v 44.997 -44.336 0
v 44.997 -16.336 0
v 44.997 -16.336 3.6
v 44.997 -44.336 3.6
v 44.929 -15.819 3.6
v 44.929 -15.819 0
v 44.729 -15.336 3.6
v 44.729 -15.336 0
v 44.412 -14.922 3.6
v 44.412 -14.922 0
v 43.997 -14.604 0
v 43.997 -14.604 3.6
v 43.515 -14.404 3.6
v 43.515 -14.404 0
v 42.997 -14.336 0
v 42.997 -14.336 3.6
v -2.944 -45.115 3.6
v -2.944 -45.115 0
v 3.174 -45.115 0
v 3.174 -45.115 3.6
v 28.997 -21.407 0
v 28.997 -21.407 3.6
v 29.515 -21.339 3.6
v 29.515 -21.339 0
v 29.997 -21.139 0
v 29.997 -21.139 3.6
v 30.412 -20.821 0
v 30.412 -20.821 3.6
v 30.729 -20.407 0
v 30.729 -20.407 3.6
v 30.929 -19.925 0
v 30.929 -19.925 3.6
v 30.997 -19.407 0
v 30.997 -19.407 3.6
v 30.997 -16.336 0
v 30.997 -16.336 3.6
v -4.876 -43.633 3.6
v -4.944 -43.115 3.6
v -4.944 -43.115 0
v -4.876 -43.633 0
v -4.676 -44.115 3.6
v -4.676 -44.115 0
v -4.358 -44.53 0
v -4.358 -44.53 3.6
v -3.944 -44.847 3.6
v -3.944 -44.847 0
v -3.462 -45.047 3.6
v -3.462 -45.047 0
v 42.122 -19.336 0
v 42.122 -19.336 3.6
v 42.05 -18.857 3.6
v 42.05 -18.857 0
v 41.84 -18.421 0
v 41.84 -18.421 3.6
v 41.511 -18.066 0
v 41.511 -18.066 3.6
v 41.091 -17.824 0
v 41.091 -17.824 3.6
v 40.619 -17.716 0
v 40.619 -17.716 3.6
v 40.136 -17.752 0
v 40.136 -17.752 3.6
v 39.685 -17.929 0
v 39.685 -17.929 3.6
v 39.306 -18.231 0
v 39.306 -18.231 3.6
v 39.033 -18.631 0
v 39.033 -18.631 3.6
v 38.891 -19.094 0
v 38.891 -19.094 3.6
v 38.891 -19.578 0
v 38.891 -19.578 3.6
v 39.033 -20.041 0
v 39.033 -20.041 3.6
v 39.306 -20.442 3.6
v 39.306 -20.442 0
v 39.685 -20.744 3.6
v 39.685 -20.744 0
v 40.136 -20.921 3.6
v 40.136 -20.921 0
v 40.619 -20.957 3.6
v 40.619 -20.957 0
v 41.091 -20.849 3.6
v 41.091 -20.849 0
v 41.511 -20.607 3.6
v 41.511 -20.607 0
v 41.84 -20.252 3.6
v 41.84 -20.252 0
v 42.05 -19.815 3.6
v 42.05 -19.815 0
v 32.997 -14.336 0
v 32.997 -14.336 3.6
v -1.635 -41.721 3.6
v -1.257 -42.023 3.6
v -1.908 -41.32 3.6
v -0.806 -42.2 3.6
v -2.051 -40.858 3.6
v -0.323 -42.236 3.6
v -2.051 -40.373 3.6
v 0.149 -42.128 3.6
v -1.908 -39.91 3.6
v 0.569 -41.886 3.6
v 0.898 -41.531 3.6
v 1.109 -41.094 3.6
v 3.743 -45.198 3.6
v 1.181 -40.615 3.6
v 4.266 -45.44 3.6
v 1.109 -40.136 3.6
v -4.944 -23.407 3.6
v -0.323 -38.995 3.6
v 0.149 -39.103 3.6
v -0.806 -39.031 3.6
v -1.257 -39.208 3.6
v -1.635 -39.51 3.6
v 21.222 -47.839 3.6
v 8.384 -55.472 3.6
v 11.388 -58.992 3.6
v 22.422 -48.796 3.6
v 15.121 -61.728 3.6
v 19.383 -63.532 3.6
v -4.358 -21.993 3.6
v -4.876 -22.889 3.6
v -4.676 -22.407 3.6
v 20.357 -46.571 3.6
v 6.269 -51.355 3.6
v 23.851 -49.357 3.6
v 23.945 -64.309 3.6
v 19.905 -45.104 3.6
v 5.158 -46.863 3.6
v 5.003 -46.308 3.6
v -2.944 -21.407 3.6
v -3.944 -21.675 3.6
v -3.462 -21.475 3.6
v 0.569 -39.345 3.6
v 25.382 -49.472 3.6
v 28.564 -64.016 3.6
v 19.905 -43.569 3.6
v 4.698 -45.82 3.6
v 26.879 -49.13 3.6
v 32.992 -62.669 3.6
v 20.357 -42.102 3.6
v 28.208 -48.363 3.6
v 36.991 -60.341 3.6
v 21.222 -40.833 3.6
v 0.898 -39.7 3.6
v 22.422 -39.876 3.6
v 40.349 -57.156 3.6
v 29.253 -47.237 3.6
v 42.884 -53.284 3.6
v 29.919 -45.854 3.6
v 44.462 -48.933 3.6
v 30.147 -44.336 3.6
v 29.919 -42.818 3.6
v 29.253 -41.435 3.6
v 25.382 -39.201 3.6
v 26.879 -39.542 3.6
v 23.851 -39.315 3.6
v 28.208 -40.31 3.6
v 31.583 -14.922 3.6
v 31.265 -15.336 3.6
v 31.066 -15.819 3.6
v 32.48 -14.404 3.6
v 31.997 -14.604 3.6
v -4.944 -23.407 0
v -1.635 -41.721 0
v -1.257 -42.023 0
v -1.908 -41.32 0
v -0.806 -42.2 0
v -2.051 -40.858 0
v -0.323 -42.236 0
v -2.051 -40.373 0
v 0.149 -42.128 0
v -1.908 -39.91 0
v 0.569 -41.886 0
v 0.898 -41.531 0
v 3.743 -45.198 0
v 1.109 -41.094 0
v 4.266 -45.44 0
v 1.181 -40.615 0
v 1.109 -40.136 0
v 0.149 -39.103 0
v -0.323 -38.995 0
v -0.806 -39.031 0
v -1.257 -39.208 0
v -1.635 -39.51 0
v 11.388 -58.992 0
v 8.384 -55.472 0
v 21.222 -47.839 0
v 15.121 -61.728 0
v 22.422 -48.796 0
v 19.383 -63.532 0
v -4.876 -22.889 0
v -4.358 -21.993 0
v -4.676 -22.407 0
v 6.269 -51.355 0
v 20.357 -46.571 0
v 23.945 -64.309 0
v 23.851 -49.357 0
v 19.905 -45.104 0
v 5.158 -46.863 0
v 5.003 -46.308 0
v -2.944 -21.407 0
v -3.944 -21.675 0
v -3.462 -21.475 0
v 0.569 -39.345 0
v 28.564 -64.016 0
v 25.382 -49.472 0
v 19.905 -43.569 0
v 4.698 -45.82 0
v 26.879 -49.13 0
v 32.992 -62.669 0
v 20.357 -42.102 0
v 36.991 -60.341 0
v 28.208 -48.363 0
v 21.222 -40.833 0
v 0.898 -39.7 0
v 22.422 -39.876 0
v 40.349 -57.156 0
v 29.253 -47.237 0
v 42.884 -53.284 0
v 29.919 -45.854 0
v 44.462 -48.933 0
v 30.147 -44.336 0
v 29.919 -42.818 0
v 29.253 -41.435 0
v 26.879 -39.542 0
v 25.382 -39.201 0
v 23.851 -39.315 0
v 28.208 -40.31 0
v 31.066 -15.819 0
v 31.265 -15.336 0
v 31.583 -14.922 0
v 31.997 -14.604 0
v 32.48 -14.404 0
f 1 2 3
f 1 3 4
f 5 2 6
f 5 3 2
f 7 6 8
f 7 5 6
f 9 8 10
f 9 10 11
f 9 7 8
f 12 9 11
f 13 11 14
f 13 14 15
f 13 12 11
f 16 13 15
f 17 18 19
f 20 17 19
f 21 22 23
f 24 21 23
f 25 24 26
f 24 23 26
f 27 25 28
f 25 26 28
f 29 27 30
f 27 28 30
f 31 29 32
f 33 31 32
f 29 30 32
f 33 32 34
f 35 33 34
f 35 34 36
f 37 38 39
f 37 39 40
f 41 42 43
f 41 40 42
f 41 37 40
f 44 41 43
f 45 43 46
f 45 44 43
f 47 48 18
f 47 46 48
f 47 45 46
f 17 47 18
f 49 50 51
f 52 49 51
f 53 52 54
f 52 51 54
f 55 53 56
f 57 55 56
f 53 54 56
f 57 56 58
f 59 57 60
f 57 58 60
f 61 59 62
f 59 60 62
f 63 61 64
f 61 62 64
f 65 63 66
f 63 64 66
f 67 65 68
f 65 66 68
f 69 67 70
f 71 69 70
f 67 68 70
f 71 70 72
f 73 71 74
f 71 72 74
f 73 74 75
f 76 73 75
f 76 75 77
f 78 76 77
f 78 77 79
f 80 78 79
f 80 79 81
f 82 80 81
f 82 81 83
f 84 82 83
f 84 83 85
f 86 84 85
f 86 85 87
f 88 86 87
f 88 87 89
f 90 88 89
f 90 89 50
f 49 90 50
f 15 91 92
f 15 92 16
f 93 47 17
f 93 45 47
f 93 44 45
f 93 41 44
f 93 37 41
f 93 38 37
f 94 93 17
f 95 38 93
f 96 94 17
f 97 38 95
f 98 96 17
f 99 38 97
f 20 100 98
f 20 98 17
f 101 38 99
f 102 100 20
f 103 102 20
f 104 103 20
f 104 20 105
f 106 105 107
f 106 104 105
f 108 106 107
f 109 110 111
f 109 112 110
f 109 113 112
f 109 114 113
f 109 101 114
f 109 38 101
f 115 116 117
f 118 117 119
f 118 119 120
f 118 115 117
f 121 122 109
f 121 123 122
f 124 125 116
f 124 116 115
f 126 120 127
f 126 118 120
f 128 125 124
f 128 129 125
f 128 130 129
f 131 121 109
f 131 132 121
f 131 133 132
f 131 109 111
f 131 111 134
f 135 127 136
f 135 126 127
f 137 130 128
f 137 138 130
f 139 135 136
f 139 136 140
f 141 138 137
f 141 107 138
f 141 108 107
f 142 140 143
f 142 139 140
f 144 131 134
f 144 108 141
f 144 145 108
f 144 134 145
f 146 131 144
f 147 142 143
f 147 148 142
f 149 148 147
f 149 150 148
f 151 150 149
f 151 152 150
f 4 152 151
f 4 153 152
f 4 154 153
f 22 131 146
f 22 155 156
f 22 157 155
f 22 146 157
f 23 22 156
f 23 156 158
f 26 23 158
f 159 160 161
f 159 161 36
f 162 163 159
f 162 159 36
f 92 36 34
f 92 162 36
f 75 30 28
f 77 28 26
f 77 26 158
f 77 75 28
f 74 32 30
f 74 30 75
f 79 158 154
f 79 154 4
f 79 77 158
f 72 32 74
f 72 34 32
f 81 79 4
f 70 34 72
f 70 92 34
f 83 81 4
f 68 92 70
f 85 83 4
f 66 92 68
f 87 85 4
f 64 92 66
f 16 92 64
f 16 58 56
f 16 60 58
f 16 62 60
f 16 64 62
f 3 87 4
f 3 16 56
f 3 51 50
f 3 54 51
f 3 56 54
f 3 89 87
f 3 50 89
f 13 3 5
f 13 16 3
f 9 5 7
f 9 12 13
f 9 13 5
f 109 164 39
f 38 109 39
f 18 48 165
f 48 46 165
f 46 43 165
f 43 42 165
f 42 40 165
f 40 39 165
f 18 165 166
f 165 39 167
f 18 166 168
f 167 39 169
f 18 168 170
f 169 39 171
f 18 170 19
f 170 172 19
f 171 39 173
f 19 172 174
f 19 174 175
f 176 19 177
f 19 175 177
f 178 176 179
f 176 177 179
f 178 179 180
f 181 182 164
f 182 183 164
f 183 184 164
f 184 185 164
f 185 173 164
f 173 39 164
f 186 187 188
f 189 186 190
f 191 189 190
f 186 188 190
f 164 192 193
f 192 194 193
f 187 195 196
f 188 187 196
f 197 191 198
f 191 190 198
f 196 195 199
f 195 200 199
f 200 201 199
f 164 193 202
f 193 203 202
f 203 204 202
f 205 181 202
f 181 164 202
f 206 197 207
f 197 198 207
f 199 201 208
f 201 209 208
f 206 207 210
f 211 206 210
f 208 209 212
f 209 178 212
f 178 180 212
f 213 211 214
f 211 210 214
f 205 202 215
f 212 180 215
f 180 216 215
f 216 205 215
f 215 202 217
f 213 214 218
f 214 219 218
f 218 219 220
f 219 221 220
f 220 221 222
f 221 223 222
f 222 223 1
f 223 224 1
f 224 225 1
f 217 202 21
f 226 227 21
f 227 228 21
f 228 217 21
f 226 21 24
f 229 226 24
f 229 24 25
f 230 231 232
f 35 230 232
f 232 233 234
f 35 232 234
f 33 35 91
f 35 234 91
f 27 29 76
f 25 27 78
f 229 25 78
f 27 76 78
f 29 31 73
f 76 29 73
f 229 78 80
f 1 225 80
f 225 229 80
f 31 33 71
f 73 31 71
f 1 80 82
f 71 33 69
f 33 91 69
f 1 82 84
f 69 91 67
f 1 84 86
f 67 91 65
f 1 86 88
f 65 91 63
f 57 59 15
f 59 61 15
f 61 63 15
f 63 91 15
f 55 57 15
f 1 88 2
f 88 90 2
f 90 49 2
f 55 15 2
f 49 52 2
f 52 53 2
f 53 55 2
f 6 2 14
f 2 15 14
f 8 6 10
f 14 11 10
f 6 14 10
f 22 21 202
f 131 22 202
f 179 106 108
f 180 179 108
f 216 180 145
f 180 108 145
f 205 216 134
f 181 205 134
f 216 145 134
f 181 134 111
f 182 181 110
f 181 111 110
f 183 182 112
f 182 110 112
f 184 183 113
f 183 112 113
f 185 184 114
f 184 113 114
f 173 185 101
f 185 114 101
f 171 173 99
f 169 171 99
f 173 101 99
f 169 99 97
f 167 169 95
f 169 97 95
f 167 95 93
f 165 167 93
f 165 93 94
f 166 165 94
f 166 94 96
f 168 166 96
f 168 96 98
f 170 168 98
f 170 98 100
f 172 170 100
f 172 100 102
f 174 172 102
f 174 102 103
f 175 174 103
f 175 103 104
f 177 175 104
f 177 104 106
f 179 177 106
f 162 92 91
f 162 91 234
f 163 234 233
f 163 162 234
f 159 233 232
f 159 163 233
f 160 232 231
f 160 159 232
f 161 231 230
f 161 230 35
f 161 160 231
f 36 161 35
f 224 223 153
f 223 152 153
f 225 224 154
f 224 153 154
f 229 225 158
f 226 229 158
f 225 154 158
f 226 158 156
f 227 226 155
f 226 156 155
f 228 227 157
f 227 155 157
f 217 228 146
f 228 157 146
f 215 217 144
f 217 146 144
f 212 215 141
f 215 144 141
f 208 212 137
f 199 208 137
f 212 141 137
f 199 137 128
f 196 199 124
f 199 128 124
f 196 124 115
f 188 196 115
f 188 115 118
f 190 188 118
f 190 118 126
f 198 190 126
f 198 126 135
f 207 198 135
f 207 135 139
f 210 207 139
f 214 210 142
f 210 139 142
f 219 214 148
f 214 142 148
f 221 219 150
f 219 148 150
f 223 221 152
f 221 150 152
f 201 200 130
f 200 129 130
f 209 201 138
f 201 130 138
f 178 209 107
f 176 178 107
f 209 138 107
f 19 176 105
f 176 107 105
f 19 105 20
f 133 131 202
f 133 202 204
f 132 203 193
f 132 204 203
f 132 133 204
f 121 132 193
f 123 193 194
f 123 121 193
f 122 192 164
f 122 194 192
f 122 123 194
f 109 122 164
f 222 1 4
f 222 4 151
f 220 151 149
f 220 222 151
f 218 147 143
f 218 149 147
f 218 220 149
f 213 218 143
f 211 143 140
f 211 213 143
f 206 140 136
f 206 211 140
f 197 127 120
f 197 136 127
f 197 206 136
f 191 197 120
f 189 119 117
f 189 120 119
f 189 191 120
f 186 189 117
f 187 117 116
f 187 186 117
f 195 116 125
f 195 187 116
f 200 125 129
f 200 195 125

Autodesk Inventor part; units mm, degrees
ref_plane "YZ Plane" through (0, 0, 0) normal (1, 0, 0) x (0, 1, 0)
ref_plane "XZ Plane" through (0, 0, 0) normal (0, 1, 0) x (-1, 0, 0)
ref_plane "XY Plane" through (0, 0, 0) normal (0, 0, 1) x (1, 0, 0)
sketch "Sketch1" plane through (0, 0, 0) normal (0, 0, 1) x (1, 0, 0)
  circle A0 centre (24.9974, -44.3363) radius 20
  line L0 (44.9974, -44.3363) -> (30.9974, -44.3363)
  line L1 (30.9974, -44.3363) -> (30.9974, -14.3363)
  line L2 (30.9974, -14.3363) -> (44.9974, -14.3363)
  line L3 (44.9974, -14.3363) -> (44.9974, -44.3363)
  line L4 (30.9974, -21.407) -> (-4.9442, -21.407)
  line L5 (-4.9442, -21.407) -> (-4.9442, -45.1154)
  line L6 (-4.9442, -45.1154) -> (30.9974, -45.1154)
  line L7 (30.9974, -45.1154) -> (30.9974, -21.407)
  point P0 (0, 0)
  dimension "d0" = 40
  dimension "d1" = 14
  dimension "d2" = 30
extrude "Extrusion1" add sketch "Sketch1" along normal blind 3.6
sketch "Sketch2" plane through (0, 0, 3.6) normal (0, 0, 1) x (1, 0, 0)
  arc A0 (5.0125, -45.1154) -> (44.9974, -44.3363) centre (24.9974, -44.3363) ccw projected
  circle A1 centre (24.9974, -44.3363) radius 5.15
  circle A2 centre (-0.4442, -40.6154) radius 1.625
  line L0 (-4.9442, -21.407) -> (-4.9442, -45.1154) projected
  line L1 (-4.9442, -45.1154) -> (5.0125, -45.1154) projected
  circle A3 centre (40.4974, -19.3363) radius 1.625
  line L2 (44.9974, -44.3363) -> (44.9974, -14.3363) projected
  point P0 (0, 0)
  dimension "d5" = 10.3
  dimension "d6" = 3.25
  dimension "d9" = 4.5
  dimension "d10" = 4.5
  dimension "d11" = 3.25
  dimension "d12" = 4.5
  dimension "d13" = 25
extrude "Extrusion2" cut sketch "Sketch2" against normal blind 20
fillet "Fillet1" radius 2 6 edges at (44.9974, -14.3363, 1.8) (-4.9442, -45.1154, 1.8) (30.9974, -14.3363, 1.8) (-4.9442, -21.407, 1.8) (30.9974, -21.407, 1.8) (5.0125, -45.1154, 1.8)
properties part number "p6"
